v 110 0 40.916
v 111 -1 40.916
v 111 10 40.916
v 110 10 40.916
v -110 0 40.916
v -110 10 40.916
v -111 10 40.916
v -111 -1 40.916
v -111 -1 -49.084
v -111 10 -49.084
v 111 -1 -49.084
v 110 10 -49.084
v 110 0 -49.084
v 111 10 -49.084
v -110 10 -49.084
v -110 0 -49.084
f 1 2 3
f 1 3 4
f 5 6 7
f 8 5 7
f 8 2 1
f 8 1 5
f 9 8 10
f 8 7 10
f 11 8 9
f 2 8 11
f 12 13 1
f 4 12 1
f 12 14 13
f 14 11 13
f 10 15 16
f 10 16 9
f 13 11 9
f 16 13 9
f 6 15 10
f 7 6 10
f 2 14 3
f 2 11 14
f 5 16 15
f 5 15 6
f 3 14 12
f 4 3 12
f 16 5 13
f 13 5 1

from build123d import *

# Parameters (mm, degrees)
F1_DEPTH = 1
F2_W     = 1
F2_H     = 90
F3_DEPTH = 10


with BuildPart() as f1:
    # F0 (on Front) → F1 (new body)
    with BuildSketch(Plane.XZ):
        Polygon((111, -49.083949), (111, 40.916051), (60.5, 40.916051), (0, 40.916051), (-111, 40.916051), (-111, -49.083949), align=None)
    extrude(amount=F1_DEPTH)

    # F2 (on face) → F3 (join)
    with BuildSketch(Plane(origin=(0, 0, 0), x_dir=(-1, 0, 0), z_dir=(0, 1, 0))):
        with Locations((-110.5, -4.083949)):
            Rectangle(F2_W, F2_H)
        with Locations((110.5, -4.083949)):
            Rectangle(F2_W, F2_H)
    extrude(amount=F3_DEPTH)


solid = f1.part
